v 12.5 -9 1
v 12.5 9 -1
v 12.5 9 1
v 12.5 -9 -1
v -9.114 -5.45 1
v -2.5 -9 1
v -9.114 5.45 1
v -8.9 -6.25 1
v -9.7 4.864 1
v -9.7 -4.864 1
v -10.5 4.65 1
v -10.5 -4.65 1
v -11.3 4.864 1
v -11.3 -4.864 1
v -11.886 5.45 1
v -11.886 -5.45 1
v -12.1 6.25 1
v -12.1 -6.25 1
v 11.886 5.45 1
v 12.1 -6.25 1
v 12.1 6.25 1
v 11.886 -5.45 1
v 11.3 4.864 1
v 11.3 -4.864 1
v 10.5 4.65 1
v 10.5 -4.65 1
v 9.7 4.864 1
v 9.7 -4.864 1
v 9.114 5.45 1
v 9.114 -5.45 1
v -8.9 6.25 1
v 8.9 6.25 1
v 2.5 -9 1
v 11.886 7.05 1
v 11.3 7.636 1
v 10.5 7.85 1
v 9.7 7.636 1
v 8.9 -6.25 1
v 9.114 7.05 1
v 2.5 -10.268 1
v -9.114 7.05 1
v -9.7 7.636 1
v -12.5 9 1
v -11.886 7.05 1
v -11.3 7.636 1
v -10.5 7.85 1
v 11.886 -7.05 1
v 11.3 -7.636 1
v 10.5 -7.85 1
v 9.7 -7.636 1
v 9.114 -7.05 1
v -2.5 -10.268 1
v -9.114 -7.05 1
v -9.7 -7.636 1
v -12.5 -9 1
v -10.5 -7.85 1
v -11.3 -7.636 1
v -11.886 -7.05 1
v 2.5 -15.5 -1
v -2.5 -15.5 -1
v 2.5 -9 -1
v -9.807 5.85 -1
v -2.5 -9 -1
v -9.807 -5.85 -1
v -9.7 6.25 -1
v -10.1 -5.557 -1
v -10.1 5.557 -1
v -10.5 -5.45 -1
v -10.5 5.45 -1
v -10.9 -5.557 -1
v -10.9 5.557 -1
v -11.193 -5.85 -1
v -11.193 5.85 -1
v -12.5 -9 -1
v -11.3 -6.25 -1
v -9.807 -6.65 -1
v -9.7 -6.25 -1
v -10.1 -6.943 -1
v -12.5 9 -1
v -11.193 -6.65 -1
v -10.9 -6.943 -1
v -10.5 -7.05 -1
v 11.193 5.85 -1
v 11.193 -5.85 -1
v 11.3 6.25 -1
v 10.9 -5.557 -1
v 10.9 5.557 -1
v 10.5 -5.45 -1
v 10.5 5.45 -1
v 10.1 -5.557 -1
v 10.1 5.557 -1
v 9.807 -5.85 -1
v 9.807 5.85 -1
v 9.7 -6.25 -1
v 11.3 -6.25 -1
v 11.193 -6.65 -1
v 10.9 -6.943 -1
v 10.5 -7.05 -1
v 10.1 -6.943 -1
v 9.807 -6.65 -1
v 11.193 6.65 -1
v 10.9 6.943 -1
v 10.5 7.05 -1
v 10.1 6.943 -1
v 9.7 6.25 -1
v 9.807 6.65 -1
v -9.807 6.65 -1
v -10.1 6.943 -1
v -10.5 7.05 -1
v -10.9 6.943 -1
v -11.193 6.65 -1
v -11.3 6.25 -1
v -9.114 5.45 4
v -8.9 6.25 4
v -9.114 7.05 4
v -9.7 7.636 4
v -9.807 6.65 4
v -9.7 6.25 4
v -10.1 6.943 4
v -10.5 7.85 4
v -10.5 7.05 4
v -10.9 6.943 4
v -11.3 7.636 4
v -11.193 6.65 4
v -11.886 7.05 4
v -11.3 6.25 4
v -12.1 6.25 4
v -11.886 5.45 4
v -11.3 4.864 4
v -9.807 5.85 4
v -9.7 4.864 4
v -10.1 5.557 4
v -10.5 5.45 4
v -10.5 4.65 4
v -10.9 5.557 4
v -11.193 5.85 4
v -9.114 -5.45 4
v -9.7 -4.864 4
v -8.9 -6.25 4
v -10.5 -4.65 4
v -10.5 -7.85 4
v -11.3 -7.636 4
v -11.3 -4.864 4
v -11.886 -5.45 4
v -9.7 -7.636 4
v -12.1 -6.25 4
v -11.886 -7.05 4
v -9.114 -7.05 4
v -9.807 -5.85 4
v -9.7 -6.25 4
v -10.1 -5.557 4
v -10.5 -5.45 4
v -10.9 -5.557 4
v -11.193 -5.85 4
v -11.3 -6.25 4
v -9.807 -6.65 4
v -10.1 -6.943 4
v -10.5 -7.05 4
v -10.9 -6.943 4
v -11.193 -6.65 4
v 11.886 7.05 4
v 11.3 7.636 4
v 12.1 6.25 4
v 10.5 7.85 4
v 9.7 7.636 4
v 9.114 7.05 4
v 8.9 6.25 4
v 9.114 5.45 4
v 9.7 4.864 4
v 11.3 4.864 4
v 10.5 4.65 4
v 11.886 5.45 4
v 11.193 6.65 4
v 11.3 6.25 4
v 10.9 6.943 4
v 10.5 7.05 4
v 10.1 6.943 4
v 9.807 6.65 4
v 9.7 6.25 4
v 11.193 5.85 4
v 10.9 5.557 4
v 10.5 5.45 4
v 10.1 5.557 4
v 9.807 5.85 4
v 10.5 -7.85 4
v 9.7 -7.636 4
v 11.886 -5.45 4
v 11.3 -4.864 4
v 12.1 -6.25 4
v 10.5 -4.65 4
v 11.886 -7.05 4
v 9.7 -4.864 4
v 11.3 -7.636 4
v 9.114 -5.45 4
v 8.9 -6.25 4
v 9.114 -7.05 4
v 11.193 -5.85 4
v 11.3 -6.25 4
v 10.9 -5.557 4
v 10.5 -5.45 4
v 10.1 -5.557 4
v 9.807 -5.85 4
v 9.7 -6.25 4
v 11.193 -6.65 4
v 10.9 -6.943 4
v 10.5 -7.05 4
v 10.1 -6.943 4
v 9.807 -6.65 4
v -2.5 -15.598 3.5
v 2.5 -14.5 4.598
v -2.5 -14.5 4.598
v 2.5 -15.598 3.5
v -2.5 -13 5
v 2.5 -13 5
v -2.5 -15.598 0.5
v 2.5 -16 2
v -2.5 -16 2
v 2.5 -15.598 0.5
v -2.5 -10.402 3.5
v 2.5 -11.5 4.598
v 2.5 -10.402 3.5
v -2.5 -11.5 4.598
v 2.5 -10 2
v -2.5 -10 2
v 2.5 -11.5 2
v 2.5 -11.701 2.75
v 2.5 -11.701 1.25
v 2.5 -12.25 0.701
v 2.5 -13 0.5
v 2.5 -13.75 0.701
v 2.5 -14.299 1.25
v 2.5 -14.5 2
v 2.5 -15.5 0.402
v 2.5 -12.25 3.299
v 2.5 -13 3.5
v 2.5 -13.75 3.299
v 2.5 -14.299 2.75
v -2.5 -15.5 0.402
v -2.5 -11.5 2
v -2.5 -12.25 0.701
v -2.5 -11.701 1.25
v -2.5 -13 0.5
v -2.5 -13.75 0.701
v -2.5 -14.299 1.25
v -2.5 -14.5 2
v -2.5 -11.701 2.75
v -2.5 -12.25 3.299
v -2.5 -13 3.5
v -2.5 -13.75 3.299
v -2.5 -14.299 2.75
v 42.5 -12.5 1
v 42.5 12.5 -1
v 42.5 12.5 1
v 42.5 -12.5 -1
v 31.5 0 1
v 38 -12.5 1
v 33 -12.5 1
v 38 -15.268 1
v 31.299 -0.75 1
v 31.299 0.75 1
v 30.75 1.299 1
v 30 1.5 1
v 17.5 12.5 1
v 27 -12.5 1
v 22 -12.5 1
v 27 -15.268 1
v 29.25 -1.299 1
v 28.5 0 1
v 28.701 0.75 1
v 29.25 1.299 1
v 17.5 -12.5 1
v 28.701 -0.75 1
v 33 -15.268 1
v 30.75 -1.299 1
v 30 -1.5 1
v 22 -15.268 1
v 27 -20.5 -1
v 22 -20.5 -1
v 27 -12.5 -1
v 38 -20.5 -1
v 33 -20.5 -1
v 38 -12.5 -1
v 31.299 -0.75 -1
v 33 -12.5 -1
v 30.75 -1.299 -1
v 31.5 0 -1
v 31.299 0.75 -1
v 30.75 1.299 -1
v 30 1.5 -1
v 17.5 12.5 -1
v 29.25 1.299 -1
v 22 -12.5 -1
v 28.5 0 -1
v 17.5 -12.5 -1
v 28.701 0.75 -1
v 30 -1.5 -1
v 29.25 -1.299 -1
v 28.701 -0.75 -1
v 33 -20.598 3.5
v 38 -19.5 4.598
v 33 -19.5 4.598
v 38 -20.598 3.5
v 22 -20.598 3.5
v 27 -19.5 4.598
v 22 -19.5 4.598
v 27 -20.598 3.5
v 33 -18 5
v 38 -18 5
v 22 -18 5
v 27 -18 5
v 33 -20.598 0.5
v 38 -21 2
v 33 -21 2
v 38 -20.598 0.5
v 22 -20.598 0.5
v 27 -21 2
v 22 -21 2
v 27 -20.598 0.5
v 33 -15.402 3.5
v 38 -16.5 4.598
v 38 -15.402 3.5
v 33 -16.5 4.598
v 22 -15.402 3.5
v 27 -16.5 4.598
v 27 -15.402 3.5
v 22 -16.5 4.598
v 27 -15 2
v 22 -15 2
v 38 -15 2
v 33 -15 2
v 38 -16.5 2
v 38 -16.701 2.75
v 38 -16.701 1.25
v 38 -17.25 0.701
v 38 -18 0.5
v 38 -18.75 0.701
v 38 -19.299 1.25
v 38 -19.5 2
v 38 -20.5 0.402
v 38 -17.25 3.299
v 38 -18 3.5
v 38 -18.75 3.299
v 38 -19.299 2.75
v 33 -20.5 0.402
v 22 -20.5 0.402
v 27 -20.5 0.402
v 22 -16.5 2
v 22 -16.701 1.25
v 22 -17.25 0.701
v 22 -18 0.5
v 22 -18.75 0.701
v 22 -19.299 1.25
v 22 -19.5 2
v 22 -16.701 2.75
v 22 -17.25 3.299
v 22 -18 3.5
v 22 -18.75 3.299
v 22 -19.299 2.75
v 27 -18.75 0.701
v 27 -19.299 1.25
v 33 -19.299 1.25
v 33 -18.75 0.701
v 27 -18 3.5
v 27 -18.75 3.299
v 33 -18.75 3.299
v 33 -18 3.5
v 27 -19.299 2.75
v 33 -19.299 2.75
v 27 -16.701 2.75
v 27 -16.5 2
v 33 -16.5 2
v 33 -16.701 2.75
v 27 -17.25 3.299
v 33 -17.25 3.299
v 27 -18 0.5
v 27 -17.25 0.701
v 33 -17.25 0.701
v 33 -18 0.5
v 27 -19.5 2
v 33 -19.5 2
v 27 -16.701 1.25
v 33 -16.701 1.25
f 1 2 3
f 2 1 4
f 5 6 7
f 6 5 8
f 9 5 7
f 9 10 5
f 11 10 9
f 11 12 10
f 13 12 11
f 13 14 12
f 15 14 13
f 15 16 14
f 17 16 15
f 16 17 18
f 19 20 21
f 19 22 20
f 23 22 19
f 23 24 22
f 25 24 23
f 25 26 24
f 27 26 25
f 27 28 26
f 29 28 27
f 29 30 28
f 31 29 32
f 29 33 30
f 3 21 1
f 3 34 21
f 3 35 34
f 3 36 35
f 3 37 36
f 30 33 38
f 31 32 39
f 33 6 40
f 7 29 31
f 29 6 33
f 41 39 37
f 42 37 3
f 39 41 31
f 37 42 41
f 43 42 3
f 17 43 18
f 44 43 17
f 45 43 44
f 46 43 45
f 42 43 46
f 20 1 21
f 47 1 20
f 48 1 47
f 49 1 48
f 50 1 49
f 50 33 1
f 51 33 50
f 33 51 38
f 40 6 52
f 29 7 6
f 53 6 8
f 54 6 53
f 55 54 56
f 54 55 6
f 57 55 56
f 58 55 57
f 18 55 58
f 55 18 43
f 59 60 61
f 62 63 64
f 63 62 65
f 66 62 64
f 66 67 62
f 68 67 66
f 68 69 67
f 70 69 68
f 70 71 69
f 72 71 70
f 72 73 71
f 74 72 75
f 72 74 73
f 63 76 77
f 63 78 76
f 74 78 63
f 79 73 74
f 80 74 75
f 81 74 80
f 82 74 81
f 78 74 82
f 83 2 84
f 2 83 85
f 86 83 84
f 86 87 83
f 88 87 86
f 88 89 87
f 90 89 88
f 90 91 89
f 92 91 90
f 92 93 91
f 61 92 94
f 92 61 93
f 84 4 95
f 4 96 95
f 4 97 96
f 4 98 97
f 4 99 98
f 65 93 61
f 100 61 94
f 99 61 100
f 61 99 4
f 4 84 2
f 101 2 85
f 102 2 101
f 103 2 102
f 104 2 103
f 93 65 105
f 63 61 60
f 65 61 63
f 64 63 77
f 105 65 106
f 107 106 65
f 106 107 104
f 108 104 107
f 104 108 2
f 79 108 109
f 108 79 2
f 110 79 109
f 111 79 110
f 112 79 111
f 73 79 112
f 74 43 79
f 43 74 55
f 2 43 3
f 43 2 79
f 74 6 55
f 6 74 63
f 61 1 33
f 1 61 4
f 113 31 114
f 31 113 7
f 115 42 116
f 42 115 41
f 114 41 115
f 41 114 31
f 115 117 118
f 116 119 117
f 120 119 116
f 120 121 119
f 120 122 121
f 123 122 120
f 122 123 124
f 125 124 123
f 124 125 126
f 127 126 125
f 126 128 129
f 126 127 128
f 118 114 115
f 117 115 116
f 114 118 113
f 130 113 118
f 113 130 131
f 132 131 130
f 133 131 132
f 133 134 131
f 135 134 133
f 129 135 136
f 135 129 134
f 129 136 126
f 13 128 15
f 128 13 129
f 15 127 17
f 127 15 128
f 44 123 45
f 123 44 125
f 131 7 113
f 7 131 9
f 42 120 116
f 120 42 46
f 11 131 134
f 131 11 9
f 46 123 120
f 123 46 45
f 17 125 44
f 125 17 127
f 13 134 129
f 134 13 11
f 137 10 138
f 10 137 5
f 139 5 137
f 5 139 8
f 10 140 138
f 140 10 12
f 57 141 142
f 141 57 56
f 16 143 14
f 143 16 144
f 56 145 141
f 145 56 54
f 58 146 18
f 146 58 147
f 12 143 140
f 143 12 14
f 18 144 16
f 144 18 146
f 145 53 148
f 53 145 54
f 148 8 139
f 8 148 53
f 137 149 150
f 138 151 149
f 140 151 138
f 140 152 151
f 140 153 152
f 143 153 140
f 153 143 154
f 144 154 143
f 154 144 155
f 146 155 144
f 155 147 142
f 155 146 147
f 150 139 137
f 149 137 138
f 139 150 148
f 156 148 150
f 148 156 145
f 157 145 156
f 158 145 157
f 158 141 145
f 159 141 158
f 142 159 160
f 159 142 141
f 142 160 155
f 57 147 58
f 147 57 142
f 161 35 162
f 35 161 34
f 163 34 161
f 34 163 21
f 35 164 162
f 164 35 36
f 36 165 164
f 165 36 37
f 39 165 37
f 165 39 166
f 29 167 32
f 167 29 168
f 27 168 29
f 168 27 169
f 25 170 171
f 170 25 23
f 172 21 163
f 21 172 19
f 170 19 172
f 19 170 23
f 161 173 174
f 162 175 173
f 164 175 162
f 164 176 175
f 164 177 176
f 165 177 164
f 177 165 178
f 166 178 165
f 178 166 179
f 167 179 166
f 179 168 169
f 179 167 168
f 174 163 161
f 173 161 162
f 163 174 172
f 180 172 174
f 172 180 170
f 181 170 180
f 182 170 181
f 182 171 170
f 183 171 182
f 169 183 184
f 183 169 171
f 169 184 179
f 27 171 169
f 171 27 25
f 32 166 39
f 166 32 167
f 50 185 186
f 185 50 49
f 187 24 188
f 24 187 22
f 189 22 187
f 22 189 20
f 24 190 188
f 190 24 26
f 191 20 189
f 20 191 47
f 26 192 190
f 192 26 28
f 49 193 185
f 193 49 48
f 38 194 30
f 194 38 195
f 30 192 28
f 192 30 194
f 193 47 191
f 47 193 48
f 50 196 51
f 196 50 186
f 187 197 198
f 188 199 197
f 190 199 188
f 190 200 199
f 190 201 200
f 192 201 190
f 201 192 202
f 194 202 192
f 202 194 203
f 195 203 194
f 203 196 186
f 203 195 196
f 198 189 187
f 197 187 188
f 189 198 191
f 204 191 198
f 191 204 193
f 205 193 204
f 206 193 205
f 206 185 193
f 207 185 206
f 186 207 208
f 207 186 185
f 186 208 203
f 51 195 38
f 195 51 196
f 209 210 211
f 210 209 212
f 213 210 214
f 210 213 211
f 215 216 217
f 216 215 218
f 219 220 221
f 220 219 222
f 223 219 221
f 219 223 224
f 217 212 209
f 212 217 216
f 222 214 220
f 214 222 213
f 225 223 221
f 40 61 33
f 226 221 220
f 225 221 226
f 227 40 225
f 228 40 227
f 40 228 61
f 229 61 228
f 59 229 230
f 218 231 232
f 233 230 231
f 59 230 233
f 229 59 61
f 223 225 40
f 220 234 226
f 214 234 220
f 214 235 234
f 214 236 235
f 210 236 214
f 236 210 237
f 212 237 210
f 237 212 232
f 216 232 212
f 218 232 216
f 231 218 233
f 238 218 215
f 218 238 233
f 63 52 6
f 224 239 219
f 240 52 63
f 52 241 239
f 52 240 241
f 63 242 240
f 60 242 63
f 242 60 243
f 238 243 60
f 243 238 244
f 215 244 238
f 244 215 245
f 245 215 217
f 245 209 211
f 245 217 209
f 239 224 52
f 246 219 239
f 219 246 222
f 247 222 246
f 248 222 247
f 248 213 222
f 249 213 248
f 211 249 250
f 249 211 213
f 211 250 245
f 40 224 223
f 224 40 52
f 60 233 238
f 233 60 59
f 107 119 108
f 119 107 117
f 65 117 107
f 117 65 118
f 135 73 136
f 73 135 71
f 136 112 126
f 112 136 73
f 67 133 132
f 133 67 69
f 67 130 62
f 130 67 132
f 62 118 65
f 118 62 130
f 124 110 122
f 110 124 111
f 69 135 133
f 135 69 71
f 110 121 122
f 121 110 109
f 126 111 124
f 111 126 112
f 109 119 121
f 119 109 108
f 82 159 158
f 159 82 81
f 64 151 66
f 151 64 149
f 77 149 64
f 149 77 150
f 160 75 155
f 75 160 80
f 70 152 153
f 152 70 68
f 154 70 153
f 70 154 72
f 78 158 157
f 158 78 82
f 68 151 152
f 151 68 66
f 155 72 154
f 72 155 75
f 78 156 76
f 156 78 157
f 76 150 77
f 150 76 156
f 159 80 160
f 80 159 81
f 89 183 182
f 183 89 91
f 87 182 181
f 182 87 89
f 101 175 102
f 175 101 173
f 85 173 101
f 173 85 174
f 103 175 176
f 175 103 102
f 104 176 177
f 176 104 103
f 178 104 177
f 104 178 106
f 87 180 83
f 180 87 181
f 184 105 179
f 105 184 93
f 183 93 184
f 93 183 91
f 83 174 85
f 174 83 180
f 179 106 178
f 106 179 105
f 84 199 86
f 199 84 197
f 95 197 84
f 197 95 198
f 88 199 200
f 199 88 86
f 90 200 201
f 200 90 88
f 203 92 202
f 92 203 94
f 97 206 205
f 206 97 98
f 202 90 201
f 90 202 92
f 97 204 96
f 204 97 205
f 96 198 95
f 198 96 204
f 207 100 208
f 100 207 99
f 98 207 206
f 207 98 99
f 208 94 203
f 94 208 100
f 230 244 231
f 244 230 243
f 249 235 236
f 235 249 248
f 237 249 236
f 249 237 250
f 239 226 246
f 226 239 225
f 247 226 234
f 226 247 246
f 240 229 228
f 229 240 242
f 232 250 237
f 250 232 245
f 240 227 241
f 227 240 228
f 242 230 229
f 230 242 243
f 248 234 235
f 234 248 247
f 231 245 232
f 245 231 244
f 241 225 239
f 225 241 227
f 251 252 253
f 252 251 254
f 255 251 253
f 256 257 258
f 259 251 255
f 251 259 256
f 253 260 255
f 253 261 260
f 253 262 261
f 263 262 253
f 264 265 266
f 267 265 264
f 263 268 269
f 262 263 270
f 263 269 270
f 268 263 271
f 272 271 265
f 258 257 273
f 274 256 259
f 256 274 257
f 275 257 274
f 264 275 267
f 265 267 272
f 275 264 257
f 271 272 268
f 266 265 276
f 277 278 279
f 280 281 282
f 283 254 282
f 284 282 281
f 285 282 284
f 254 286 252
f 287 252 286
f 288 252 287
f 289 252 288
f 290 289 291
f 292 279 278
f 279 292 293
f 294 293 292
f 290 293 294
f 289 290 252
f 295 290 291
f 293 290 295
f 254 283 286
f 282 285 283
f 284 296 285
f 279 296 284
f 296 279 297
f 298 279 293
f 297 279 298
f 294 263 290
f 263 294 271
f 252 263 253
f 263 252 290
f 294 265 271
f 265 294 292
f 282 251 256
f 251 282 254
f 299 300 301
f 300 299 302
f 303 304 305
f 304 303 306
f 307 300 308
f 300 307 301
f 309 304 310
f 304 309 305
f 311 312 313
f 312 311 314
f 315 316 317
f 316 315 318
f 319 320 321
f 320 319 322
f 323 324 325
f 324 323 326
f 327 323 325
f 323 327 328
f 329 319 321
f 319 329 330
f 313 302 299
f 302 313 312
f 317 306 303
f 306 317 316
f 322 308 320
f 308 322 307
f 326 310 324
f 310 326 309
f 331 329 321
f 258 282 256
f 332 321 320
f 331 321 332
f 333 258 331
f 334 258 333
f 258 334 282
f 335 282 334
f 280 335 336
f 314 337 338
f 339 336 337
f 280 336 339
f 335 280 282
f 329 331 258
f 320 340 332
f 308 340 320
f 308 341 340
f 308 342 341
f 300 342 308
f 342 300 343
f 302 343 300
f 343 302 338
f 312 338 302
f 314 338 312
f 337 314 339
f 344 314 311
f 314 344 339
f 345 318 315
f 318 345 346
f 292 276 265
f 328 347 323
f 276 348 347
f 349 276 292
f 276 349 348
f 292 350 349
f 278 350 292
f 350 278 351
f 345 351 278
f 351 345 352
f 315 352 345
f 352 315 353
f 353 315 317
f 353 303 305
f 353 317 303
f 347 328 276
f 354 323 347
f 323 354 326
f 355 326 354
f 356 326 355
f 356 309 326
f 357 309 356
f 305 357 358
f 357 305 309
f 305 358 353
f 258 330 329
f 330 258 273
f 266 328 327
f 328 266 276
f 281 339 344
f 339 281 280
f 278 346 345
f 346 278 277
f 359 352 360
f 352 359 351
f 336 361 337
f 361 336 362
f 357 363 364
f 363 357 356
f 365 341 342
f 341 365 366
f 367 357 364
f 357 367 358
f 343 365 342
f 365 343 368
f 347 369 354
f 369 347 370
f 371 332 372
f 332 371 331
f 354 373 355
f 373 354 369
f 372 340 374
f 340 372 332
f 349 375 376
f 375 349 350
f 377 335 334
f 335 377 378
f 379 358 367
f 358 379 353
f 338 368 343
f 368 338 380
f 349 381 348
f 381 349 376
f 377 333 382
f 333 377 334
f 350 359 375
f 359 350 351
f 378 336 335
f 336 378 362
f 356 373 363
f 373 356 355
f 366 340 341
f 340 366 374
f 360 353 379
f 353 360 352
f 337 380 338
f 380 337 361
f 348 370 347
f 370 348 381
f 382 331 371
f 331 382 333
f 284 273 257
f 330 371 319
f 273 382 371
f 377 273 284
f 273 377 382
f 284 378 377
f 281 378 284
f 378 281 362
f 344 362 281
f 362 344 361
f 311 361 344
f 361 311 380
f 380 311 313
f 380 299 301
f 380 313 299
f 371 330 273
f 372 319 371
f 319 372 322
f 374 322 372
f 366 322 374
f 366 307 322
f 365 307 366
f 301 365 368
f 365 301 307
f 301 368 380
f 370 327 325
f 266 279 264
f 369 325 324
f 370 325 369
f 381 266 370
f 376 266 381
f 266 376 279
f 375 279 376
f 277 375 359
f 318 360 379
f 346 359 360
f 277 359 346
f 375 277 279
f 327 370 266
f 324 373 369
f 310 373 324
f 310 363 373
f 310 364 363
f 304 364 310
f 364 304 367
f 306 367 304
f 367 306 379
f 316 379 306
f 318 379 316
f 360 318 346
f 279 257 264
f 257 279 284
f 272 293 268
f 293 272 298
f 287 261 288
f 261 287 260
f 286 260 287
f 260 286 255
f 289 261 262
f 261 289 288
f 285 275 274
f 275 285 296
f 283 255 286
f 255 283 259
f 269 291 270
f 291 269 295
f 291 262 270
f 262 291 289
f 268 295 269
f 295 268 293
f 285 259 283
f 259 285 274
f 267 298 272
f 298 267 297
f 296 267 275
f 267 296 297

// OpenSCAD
// Arduino camera mount for my robot Explorer

module cam_base() {
  difference() {
    union() {
      // base plate
      cube([25, 18, 2], center=true);

      // 4 stand-offs
      translate([-10.5, 6.25, 0]) cylinder(d=3.2, h=4);
      translate([-10.5, -6.25, 0]) cylinder(d=3.2, h=4);
      translate([10.5, 6.25, 0]) cylinder(d=3.2, h=4);
      translate([10.5, -6.25, 0]) cylinder(d=3.2, h=4);

      // connect the stand-offs up the sides for strength
      // these would conflict with board components
      //translate([-10.5, 0, 1.5]) cube([3.2, 12.5, 4], center=true);
      //translate([10.5, 0, 1.5]) cube([3.2, 12.5, 4], center=true);

      // tab for connecting to the base
      translate([-2.5, -13, 2]) rotate([0, 90, 0]) cylinder(d=6, h=5);
      translate([0, -12, 0]) cube([5, 7, 2], center=true);
      }
    union() {
      translate([-10.5, 6.25, 0]) cylinder(d=1.6, h=12, center=true);
      translate([-10.5, -6.25, 0]) cylinder(d=1.6, h=12, center=true);
      translate([10.5, 6.25, 0]) cylinder(d=1.6, h=12, center=true);
      translate([10.5, -6.25, 0]) cylinder(d=1.6, h=12, center=true);
      translate([-4, -13, 2]) rotate([0, 90, 0]) cylinder(d=3, h=8);
    }
  }
}

module robot_mount() {
  difference() {
    union() {
      cube([25, 25, 2], center=true);
      translate([-8, -18, 2]) rotate([0, 90, 0]) cylinder(d=6, h=16);
      translate([0, -16, 0]) cube([16, 9, 2], center=true);
    }
    union() {
      translate([-40, -18, 2]) rotate([0, 90, 0]) cylinder(d=3, h=80);
      translate([0, -18.5, 0]) cube([6, 12, 12], center=true);
      cylinder(d=3, h=20, center=true);
    }
  }
}

module extension_arm() {
}

$fn=12;
cam_base();
translate([30, 0, 0]) robot_mount();
